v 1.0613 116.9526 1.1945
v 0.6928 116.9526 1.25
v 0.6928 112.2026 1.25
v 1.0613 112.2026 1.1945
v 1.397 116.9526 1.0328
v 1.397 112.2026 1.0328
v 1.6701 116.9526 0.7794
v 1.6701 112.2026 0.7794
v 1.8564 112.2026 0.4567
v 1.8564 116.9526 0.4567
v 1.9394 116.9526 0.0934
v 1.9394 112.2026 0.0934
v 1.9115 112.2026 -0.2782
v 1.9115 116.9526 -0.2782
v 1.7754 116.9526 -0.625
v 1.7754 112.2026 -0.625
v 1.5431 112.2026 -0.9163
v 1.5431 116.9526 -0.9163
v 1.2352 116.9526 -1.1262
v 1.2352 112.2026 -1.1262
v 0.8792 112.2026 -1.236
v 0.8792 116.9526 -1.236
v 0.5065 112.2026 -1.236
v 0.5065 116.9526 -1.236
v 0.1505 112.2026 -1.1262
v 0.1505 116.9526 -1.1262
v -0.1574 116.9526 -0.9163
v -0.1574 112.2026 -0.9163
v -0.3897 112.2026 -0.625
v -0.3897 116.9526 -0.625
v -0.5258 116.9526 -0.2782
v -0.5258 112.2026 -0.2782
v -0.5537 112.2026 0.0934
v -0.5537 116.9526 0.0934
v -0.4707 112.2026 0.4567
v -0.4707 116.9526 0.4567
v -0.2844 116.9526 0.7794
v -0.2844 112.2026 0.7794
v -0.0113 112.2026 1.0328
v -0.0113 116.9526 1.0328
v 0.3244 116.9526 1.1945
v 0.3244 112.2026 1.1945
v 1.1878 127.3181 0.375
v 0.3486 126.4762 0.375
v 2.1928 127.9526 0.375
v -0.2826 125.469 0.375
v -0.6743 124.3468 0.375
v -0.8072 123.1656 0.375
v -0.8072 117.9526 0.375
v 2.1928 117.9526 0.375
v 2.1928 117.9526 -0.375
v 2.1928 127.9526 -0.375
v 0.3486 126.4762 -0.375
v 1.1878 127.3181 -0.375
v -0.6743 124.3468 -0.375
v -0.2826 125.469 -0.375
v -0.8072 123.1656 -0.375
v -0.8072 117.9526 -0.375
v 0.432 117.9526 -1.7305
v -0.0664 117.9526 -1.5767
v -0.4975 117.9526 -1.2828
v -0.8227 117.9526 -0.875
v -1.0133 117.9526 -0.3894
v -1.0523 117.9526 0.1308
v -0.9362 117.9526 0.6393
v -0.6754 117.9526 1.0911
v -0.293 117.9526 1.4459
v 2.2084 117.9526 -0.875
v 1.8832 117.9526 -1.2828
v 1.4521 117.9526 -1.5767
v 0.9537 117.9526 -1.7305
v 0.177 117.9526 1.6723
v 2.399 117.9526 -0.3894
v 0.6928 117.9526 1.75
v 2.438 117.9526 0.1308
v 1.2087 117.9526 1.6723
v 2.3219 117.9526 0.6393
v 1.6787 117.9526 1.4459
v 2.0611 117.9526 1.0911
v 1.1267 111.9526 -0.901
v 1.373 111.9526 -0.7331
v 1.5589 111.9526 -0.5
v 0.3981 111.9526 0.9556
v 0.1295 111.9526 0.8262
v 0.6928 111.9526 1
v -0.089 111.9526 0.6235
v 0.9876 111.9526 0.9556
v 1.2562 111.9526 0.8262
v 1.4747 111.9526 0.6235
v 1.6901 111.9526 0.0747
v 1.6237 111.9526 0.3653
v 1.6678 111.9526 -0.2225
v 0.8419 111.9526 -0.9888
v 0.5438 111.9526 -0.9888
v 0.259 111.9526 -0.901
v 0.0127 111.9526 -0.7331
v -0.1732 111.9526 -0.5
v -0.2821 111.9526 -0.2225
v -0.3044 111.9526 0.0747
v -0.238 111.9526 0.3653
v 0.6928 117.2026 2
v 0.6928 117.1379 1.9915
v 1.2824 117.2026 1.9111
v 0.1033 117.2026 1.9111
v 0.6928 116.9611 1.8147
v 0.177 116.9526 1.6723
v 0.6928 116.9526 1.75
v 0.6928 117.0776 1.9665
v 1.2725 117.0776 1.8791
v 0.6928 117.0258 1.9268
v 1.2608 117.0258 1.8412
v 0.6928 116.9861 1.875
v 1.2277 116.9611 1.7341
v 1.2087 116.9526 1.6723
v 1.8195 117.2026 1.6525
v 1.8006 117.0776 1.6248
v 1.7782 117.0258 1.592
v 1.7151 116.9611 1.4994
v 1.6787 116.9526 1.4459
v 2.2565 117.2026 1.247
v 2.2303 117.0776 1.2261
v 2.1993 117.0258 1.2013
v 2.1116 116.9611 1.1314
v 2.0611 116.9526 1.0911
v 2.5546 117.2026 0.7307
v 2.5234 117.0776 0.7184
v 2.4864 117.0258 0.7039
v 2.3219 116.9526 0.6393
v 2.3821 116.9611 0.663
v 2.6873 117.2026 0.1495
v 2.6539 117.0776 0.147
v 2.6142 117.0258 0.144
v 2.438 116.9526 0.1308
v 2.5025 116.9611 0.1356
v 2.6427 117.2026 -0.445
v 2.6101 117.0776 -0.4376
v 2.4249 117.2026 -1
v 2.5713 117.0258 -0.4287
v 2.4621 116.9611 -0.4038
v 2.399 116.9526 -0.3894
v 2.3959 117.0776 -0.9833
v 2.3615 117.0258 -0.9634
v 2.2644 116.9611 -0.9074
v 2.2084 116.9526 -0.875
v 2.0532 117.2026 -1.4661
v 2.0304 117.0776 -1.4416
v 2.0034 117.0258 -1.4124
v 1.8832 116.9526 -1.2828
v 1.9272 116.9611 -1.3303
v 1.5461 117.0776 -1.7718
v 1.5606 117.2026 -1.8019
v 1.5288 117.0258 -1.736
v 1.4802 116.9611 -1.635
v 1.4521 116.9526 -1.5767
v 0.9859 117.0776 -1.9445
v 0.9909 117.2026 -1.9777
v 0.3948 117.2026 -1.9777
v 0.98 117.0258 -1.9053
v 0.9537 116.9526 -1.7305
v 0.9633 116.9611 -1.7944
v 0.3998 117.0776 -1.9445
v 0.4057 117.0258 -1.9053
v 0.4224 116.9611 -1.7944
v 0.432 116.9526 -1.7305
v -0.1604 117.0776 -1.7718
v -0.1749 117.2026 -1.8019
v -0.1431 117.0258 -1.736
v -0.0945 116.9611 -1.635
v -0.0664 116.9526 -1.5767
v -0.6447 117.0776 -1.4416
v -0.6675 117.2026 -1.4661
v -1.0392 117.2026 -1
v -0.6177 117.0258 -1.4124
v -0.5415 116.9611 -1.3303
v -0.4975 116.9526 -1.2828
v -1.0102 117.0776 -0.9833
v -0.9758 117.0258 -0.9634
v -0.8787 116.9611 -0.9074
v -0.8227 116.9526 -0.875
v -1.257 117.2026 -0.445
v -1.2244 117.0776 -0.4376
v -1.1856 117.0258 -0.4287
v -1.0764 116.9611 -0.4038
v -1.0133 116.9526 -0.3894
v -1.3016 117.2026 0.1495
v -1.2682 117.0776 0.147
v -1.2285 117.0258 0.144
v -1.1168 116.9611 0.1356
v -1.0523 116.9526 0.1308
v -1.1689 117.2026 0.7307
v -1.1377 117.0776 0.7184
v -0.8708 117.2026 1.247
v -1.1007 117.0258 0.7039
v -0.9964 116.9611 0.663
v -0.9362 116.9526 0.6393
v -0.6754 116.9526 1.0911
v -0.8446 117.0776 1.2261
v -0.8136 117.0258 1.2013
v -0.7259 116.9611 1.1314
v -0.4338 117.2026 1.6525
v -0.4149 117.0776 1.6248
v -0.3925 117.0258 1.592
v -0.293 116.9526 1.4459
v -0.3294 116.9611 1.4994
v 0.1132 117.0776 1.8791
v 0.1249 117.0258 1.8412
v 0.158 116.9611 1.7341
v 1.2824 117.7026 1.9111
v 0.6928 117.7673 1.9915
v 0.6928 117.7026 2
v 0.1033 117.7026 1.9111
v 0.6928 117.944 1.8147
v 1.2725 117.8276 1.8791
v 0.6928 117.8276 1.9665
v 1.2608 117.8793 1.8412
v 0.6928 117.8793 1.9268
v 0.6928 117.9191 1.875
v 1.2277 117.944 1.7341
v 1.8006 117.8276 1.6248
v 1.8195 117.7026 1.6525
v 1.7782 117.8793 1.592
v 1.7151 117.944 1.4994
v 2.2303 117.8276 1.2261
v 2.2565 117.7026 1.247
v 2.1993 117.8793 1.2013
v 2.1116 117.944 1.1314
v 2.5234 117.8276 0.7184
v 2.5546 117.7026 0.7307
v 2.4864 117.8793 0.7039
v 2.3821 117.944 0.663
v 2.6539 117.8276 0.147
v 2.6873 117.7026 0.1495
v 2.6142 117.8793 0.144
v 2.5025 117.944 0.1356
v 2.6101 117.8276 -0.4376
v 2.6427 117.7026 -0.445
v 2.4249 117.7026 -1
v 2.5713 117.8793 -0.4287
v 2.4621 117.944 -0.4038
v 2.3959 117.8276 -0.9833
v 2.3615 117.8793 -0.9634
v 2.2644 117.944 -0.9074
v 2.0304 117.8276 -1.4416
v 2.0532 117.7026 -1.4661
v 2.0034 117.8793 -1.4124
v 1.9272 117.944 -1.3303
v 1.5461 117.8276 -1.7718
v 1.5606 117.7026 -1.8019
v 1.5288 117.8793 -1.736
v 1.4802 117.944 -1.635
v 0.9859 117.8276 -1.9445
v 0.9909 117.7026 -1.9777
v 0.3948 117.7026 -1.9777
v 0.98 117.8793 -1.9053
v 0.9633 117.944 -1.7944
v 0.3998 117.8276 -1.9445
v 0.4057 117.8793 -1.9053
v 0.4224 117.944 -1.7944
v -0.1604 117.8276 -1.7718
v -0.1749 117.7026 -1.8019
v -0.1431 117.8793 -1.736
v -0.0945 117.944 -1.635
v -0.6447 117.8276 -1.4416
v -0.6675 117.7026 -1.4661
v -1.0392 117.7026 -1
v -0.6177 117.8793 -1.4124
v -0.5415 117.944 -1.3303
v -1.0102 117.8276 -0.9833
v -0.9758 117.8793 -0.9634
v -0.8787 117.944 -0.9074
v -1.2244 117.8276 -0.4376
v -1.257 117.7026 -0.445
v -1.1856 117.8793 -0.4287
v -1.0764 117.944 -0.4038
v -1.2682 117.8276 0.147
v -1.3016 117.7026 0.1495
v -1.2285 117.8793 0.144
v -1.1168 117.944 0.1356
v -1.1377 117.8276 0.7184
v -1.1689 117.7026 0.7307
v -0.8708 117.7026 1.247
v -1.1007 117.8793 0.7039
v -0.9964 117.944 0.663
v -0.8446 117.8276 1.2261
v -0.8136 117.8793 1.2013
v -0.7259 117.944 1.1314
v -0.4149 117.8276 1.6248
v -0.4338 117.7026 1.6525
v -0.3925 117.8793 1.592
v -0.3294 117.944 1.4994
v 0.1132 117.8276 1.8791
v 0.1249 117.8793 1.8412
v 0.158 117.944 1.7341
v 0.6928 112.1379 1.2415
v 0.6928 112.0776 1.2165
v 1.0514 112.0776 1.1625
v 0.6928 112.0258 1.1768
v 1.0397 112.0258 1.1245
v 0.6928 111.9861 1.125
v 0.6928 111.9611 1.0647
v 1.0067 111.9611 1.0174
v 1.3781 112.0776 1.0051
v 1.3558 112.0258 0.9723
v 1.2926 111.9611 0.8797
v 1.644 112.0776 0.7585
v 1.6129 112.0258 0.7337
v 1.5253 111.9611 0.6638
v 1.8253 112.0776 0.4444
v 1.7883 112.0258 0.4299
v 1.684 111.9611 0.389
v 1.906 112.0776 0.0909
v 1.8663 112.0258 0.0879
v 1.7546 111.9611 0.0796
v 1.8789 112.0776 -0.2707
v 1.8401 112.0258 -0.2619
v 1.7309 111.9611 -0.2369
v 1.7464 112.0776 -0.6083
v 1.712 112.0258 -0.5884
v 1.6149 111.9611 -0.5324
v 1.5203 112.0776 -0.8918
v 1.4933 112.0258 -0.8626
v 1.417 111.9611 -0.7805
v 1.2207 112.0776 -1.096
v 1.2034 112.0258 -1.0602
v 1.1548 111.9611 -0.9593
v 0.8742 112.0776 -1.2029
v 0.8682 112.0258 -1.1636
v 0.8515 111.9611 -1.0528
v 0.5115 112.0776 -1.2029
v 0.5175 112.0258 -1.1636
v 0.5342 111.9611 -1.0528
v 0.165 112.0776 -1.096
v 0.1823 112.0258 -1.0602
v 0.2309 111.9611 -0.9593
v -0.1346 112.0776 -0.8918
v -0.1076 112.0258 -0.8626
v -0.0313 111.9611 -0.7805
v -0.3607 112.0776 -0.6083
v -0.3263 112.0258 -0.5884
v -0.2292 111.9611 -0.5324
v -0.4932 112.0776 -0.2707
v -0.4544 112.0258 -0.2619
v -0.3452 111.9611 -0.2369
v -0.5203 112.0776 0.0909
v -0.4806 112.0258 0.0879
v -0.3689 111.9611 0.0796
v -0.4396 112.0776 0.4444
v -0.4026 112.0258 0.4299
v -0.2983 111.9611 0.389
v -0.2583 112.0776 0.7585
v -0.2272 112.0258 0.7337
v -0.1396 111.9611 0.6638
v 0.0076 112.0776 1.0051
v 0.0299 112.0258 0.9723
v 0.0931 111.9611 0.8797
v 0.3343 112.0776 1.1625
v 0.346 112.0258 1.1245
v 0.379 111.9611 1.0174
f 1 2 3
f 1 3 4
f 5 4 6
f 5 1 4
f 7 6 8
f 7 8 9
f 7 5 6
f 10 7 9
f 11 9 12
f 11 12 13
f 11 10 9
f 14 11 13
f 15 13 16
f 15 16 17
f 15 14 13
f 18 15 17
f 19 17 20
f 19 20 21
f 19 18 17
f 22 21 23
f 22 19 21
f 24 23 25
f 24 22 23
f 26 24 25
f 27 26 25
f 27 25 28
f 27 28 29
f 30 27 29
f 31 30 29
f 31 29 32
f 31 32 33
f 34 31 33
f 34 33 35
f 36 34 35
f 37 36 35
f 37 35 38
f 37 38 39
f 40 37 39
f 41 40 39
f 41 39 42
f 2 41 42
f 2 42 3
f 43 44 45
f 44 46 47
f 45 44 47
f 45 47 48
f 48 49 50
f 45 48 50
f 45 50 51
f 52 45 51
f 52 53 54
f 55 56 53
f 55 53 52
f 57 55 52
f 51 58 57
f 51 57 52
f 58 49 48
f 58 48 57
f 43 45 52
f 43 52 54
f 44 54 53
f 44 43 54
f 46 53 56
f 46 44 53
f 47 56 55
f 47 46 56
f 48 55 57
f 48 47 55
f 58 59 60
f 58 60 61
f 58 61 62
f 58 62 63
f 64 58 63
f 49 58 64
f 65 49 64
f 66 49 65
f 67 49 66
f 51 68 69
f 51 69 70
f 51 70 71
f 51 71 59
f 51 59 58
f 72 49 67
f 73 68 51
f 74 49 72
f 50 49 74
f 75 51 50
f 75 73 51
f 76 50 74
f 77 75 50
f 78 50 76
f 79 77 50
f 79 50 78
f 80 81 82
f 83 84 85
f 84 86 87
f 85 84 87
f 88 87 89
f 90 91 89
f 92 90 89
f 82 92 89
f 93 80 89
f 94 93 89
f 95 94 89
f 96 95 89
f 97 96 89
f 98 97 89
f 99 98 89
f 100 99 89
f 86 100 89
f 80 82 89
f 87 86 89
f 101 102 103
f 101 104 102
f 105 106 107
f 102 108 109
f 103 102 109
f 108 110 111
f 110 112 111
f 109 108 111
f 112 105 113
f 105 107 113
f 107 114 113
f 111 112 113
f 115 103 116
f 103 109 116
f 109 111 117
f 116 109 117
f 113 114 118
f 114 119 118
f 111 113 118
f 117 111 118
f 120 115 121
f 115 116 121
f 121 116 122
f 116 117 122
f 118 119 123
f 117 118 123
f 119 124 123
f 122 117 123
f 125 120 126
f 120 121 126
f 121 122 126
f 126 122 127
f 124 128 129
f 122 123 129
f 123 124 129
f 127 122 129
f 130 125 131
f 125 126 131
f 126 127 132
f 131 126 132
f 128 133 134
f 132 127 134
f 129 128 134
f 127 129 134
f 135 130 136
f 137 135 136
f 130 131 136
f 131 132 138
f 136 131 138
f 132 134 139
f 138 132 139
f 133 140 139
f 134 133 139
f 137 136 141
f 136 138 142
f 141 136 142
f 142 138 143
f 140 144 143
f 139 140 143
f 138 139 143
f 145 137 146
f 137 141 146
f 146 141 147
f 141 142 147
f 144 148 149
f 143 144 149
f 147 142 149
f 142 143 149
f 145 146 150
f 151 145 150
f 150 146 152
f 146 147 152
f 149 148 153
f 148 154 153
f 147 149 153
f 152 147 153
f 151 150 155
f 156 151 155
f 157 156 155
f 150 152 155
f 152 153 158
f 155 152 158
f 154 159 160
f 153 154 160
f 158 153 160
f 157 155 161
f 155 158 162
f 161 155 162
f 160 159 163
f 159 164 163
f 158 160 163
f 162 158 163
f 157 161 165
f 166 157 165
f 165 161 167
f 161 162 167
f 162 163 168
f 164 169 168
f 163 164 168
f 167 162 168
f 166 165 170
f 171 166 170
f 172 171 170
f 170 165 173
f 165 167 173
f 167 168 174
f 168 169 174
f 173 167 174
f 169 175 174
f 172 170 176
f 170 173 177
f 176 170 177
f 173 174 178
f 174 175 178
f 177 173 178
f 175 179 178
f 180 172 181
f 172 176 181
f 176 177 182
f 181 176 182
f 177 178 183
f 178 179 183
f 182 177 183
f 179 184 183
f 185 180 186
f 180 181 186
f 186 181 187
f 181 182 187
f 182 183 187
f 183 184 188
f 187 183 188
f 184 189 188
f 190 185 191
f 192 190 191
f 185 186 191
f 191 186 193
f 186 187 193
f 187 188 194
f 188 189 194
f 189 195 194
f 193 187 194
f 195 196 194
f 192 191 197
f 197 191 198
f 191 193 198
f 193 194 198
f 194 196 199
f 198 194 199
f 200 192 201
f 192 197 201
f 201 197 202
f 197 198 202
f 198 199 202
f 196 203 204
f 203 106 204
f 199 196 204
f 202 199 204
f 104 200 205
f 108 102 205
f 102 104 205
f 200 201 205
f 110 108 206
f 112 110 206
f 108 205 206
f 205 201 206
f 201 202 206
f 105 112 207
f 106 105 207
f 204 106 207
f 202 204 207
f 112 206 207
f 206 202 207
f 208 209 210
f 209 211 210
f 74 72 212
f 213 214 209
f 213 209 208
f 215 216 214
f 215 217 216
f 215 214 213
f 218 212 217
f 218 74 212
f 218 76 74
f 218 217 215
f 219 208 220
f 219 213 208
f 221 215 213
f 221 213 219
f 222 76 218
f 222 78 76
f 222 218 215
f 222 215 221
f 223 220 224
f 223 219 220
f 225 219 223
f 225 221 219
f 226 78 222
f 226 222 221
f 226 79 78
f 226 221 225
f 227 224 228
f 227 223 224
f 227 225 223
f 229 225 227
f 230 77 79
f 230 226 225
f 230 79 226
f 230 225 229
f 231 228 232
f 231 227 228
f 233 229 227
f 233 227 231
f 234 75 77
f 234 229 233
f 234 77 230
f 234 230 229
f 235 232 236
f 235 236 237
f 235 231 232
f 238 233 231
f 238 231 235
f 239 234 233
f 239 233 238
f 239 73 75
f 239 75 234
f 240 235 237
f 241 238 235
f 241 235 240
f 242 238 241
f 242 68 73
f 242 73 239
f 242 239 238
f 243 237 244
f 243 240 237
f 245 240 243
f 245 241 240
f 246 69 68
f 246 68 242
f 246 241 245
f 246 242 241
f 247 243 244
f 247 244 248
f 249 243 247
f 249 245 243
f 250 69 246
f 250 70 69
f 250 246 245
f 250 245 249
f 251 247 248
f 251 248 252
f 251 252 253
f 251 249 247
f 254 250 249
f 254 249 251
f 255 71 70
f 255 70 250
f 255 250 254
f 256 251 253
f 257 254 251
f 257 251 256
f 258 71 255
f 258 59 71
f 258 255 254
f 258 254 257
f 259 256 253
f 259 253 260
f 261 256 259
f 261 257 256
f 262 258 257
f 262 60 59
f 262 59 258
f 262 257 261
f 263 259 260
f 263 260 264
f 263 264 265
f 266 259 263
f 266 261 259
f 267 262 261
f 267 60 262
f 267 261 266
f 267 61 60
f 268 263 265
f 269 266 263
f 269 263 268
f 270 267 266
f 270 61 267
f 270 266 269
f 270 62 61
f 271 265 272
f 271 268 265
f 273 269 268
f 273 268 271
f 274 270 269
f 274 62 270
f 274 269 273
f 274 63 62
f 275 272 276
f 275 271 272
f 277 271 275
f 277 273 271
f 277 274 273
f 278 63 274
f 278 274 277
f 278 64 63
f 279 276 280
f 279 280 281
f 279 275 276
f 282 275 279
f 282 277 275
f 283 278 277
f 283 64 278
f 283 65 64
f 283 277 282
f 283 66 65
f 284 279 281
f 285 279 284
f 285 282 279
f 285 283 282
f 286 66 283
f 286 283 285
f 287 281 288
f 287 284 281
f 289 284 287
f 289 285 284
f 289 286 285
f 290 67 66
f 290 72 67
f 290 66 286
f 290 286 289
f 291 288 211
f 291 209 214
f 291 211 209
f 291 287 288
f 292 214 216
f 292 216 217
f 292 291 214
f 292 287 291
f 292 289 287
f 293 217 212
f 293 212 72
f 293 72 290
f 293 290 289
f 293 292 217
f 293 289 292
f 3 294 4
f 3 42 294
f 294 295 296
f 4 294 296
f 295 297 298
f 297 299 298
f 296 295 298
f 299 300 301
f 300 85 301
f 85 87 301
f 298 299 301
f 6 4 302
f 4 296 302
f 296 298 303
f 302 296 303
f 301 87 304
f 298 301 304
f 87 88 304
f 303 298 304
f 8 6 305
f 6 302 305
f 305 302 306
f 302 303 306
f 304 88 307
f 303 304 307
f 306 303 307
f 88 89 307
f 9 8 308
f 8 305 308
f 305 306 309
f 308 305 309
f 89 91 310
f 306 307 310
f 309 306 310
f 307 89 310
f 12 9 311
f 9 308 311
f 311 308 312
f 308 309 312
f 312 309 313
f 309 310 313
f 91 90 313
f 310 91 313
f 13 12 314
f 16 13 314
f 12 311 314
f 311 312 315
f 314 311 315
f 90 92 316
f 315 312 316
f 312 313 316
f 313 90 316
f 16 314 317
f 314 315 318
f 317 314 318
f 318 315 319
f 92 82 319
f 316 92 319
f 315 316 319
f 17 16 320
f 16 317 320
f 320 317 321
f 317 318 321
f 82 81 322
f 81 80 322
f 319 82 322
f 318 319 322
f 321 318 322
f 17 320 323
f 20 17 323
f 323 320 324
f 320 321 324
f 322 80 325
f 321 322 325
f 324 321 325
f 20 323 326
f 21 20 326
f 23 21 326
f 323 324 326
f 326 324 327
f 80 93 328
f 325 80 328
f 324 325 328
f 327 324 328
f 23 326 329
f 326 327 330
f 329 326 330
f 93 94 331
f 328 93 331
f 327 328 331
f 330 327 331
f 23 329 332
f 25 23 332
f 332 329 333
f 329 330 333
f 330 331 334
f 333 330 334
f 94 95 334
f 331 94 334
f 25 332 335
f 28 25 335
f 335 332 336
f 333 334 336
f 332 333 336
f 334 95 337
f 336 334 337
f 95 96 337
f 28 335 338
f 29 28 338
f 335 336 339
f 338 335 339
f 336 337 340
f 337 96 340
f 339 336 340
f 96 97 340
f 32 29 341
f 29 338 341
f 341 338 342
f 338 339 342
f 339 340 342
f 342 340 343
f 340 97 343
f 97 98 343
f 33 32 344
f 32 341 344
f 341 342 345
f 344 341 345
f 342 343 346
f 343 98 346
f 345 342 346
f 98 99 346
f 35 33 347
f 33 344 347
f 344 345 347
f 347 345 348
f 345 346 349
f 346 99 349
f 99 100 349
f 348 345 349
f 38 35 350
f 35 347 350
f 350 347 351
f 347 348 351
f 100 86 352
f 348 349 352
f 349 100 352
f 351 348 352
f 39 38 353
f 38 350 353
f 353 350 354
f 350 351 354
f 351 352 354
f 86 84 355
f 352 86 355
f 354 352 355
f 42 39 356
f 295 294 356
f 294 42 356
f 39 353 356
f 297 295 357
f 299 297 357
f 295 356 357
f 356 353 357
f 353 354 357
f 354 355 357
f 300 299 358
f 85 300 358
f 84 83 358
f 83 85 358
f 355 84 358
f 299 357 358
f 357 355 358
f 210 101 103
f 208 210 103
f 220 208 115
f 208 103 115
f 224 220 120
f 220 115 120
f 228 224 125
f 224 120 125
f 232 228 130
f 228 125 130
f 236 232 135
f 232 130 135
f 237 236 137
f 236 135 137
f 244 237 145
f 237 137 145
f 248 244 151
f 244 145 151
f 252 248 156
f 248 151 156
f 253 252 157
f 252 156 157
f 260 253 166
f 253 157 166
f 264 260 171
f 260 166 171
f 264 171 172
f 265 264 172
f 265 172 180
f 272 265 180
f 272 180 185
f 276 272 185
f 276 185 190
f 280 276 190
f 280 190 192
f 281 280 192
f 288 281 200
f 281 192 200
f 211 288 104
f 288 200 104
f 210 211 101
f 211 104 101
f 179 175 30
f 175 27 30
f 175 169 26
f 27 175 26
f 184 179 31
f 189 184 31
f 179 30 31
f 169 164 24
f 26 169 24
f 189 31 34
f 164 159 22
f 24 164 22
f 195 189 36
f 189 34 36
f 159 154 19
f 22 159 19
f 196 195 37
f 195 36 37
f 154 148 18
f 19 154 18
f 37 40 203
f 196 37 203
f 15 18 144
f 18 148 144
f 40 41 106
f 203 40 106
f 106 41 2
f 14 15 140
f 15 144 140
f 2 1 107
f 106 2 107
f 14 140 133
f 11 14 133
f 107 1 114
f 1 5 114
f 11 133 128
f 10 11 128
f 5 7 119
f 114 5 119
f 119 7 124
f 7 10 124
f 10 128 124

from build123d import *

# Parameters (mm, degrees)
SWEEP_1_PROFILE_R   = 25
SKETCH_9_R          = 40
EXTRUDE_2_DEPTH     = 20
FILLET_1_R          = 5
SKETCH_11_W         = 60
SKETCH_11_H         = 15
EXTRUDE_3_DEPTH     = 200
CUT_EXTRUDE_1_DEPTH = 326.969707196
SCALE_1_SCALE       = 0.05


with BuildPart() as part:
    # 扫描1: sweep along a path in 草图1
    with BuildLine(Plane.XY) as sweep_1_path:
        Line((0, 0), (0, 100))
    # 扫描1 profile (on start of the path) → 扫描1 (sweep)
    with BuildSketch(Plane.ZX):
        Circle(SWEEP_1_PROFILE_R)
    sweep(path=sweep_1_path.line)

    # 草图9 → 凸台-拉伸2 (add)
    with BuildSketch(Plane(origin=(0, 100, 0), x_dir=(1, 0, 0), z_dir=(0, 1, 0))):
        with Locations(Location((0, 0, 0), (0, 0, 270))):
            Circle(SKETCH_9_R)
    extrude(amount=EXTRUDE_2_DEPTH)

    # 圆角1
    fillet_1_edges = [part.edges().sort_by_distance(p)[0] for p in [
        (0, 0, -25),
        (0, 100, -40),
        (0, 120, -40),
    ]]
    fillet(fillet_1_edges, radius=FILLET_1_R)

    # 草图11 → 凸台-拉伸3 (add)
    with BuildSketch(Plane(origin=(0, 120, 0), x_dir=(1, 0, 0), z_dir=(0, 1, 0))):
        Rectangle(SKETCH_11_W, SKETCH_11_H)
    extrude(amount=EXTRUDE_3_DEPTH)

    # 草图12 → 切除-拉伸1 (cut, through all)
    with BuildSketch(Plane.XY.offset(7.5)):
        with BuildLine():
            Line((-30, 224.261621757), (-30, 320))
            Line((-30, 320), (30, 320))
            ThreePointArc((30, 320), (-13.760497544, 280.754623688), (-30, 224.261621757))
        make_face()
    extrude(amount=-CUT_EXTRUDE_1_DEPTH, mode=Mode.SUBTRACT)


with BuildPart() as part_1:
    # 缩放比例1: scaled about (0.729315594, 117.844803008, 0)
    add(part.part.scale(SCALE_1_SCALE).moved(Location((0.692849814, 111.952562858, 0))))


solid = part_1.part
